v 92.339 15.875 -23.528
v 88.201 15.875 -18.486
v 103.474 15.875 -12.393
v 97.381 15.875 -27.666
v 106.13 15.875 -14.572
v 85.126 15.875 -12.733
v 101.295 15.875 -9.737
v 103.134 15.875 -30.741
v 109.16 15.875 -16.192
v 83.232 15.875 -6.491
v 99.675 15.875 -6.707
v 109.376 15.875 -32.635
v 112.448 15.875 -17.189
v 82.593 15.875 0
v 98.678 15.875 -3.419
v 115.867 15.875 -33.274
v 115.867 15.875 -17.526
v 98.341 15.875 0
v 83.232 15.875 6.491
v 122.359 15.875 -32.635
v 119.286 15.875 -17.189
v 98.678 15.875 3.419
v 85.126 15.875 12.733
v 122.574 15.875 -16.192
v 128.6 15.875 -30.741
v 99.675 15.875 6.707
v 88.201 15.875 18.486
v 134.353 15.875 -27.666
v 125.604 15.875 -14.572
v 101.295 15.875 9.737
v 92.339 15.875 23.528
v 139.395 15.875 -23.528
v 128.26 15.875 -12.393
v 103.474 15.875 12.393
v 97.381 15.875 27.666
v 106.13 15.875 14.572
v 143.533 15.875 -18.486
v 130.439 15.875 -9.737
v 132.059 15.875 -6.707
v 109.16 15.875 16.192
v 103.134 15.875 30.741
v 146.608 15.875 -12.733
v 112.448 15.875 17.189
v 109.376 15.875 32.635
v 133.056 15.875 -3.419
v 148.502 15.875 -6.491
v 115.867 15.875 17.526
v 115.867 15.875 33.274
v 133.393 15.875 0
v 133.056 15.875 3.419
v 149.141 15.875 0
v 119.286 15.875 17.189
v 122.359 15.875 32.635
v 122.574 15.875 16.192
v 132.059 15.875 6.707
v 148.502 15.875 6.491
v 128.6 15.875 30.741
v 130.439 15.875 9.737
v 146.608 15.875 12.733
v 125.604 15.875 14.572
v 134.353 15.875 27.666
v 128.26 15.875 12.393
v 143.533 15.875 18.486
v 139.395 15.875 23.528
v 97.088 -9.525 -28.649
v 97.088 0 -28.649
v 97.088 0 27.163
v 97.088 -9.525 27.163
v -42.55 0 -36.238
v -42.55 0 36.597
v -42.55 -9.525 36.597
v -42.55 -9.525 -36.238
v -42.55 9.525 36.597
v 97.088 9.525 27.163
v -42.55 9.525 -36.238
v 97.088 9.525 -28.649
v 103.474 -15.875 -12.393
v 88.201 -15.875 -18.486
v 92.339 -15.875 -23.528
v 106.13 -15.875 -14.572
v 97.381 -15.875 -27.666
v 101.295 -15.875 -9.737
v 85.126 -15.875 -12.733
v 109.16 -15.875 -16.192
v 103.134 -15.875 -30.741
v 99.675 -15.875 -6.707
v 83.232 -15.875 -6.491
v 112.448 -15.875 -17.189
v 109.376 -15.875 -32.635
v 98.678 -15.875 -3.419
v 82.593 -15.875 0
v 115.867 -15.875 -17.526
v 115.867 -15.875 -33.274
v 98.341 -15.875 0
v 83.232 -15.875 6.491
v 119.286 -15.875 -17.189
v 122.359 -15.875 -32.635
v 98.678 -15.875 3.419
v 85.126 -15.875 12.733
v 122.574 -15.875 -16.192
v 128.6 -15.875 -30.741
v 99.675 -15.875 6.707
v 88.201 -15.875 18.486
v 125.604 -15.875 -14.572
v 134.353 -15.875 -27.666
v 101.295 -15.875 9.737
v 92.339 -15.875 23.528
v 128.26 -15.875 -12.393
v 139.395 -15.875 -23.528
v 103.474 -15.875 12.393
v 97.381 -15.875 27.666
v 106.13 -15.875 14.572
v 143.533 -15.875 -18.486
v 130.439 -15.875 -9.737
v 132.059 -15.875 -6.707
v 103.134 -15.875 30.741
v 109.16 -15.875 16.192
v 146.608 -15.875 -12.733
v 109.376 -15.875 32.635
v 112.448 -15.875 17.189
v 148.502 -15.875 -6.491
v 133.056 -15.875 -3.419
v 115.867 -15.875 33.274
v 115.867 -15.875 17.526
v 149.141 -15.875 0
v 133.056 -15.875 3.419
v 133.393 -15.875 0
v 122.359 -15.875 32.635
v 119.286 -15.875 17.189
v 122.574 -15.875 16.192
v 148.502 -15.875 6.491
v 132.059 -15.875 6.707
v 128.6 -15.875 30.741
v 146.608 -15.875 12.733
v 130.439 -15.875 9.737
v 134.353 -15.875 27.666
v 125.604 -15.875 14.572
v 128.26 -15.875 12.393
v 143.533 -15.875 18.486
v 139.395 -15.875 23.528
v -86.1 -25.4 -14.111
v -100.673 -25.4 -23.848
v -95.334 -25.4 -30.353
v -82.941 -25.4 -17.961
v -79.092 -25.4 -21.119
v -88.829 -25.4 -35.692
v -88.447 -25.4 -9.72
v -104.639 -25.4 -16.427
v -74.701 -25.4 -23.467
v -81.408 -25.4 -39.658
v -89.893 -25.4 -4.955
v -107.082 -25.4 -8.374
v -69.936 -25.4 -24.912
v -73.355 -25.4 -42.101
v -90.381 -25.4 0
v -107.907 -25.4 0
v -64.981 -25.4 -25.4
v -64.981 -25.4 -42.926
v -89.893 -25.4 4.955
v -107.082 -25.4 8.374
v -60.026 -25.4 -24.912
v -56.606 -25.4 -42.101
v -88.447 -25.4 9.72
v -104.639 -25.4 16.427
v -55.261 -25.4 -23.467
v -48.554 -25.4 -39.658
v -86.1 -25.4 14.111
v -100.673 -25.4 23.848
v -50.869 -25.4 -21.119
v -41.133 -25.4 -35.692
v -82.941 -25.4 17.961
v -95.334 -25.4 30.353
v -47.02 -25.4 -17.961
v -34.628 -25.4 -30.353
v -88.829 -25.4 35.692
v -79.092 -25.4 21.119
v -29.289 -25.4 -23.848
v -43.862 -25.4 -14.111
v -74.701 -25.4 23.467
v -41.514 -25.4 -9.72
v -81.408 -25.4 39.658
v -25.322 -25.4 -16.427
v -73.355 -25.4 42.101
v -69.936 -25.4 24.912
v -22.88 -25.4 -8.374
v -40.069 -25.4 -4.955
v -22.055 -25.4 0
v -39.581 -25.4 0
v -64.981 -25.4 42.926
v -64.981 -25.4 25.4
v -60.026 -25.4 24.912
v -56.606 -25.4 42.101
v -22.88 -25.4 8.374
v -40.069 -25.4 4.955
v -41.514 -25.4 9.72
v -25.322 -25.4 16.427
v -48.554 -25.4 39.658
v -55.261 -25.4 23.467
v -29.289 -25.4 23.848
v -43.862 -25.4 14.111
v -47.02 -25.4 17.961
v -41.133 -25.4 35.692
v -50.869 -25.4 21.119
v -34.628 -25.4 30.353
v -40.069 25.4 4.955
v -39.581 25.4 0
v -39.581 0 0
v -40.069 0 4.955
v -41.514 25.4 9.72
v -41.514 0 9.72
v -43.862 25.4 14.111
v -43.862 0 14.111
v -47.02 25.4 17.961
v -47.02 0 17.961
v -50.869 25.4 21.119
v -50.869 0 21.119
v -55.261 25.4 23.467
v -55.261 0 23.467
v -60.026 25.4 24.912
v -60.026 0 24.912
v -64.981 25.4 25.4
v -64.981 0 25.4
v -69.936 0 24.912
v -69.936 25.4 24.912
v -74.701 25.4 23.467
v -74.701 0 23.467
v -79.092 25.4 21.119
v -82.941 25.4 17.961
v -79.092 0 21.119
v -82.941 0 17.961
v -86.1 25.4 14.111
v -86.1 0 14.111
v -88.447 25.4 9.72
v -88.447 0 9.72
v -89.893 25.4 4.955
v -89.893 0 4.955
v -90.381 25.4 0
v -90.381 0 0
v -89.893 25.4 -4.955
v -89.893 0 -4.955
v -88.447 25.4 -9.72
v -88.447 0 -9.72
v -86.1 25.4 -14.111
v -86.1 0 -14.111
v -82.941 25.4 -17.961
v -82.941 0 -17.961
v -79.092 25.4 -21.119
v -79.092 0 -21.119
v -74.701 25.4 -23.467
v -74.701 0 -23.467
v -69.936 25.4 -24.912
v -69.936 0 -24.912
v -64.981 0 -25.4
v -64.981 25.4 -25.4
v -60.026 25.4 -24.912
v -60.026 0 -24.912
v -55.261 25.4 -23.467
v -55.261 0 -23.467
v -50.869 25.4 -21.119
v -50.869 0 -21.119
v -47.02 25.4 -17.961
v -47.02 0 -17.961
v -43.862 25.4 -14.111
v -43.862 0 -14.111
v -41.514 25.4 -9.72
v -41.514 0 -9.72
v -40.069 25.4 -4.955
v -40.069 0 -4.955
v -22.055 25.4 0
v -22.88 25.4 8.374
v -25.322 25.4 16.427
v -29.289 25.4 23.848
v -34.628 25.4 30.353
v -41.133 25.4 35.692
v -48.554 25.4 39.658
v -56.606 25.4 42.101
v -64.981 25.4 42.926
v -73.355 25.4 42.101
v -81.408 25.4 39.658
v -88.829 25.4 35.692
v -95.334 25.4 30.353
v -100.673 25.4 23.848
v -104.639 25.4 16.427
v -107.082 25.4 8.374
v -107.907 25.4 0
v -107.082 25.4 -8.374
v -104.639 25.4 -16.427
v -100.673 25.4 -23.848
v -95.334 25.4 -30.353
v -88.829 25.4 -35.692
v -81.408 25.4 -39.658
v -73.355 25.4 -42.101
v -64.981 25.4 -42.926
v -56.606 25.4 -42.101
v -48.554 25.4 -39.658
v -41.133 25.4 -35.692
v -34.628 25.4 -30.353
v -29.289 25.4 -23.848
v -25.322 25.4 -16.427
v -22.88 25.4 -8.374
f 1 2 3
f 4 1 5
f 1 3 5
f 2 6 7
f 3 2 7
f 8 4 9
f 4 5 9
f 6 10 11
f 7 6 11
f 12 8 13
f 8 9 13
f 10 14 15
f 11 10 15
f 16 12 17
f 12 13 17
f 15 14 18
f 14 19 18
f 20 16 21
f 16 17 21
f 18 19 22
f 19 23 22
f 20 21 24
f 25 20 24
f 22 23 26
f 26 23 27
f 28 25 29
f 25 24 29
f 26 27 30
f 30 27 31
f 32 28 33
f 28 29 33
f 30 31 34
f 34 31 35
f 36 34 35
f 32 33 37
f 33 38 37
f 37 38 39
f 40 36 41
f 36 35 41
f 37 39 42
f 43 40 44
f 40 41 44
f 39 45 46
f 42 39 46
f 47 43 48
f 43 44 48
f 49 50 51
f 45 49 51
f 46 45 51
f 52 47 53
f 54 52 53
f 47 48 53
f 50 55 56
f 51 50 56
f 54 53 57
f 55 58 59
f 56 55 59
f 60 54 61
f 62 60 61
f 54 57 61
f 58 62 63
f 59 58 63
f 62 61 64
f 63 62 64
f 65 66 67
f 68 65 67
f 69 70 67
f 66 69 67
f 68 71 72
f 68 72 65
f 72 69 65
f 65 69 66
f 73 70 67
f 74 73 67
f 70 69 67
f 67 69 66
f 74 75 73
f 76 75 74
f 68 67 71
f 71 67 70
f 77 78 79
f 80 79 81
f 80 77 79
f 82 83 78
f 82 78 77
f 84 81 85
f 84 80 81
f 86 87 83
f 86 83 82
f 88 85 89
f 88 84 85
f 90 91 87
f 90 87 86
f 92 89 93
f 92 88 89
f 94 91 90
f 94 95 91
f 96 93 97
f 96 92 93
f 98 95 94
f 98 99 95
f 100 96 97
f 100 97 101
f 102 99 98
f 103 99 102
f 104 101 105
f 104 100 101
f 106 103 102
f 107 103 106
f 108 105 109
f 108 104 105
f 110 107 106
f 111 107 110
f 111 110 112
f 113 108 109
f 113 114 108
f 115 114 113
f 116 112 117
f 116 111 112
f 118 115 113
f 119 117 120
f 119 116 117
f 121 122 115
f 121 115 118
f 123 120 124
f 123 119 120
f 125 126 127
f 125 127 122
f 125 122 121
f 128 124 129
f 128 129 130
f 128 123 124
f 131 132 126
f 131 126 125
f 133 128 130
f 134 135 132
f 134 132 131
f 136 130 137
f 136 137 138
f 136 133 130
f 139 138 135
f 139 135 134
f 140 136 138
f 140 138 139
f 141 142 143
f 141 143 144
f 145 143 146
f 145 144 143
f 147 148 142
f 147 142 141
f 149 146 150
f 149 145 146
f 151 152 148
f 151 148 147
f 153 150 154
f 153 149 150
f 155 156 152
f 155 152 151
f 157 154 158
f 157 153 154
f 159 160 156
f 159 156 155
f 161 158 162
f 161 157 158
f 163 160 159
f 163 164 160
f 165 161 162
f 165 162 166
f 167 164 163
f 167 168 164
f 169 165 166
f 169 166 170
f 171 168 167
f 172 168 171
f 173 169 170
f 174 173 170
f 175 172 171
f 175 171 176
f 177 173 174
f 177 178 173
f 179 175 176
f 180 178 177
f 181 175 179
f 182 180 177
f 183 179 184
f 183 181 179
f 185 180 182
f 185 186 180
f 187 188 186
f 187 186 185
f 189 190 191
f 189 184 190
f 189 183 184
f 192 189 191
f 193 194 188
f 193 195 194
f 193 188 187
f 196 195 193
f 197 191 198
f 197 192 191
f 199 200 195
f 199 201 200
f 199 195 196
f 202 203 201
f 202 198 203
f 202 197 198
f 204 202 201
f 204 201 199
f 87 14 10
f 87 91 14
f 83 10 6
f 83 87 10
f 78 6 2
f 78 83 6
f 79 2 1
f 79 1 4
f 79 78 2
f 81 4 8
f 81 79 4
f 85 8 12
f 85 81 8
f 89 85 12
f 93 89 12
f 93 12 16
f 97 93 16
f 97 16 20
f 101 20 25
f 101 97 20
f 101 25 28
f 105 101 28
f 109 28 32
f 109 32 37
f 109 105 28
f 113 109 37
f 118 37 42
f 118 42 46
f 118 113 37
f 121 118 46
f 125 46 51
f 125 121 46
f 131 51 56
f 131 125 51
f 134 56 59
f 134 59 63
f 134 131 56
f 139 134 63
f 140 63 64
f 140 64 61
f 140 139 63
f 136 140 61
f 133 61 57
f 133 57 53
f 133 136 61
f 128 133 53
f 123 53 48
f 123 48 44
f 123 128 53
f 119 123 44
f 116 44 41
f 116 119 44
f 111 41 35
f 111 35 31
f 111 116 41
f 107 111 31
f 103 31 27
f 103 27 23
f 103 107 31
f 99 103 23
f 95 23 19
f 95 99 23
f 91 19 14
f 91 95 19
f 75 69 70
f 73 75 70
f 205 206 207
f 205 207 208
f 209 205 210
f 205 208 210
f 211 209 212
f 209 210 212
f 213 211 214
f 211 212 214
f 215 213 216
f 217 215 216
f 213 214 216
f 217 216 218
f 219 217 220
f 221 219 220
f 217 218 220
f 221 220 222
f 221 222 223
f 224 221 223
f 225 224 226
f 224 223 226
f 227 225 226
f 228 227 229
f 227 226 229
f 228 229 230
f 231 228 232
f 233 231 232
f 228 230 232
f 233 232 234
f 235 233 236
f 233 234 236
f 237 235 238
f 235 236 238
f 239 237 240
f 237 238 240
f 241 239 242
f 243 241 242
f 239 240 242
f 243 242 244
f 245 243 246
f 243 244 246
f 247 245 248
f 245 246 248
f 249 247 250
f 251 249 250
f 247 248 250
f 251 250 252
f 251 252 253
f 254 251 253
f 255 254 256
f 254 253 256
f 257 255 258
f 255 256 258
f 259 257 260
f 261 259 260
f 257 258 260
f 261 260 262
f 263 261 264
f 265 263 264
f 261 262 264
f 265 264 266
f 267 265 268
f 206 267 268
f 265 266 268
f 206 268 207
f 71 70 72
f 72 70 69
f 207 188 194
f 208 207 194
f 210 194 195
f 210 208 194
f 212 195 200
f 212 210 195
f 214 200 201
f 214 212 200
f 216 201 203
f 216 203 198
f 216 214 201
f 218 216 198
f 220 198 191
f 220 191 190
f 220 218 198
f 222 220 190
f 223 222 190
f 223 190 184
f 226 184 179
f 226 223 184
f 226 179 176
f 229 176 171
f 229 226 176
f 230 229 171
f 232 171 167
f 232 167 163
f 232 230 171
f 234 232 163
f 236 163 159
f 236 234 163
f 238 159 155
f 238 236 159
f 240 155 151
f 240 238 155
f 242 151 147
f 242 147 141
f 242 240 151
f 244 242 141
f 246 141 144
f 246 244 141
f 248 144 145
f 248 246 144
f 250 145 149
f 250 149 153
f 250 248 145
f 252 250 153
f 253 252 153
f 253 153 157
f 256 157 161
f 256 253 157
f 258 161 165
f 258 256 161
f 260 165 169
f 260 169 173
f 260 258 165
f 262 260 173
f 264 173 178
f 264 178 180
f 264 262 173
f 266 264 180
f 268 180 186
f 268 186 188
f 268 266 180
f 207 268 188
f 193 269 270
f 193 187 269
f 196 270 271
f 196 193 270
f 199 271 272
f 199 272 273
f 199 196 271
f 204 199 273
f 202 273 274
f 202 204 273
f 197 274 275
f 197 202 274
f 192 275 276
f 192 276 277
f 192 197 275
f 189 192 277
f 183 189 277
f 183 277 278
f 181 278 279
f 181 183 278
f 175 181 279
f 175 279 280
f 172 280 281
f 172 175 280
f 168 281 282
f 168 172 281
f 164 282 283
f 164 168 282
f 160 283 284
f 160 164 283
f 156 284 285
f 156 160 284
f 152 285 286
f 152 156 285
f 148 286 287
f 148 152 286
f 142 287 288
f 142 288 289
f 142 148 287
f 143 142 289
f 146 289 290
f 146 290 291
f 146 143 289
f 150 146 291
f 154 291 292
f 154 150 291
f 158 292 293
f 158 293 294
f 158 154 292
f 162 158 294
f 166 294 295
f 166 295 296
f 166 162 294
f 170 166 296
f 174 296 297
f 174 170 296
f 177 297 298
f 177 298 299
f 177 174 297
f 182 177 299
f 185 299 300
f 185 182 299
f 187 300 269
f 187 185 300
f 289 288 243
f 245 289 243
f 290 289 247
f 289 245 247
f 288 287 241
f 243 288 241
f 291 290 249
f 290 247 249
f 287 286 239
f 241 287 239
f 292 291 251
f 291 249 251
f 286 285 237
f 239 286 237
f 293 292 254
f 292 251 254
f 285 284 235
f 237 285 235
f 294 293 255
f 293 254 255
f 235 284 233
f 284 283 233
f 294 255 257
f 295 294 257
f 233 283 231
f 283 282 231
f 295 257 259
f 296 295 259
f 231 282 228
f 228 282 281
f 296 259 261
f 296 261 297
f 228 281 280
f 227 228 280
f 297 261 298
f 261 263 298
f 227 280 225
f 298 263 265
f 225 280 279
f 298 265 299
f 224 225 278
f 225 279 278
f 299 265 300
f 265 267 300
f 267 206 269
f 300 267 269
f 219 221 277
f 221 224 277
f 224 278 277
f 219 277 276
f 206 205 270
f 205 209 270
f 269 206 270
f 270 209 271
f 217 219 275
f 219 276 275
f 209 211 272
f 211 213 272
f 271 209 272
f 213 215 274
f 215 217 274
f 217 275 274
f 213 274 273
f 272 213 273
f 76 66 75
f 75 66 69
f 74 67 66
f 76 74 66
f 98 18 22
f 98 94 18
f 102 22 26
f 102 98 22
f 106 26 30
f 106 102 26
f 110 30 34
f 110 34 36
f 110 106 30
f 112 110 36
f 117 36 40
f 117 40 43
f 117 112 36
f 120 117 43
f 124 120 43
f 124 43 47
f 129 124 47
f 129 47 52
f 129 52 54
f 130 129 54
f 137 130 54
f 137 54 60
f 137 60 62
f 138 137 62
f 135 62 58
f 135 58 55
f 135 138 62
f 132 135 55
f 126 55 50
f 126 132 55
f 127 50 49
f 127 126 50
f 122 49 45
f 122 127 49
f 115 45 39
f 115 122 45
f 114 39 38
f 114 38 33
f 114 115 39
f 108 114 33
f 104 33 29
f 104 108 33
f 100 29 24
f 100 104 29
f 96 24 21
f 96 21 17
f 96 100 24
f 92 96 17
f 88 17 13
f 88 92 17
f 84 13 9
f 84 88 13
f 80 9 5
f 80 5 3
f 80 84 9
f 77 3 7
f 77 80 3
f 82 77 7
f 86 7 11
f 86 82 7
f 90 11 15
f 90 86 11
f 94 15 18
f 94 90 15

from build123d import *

# Parameters (mm, degrees)
F1_DEPTH = 15.875
F0_R     = 42.926
F0_R_2   = 25.4
F2_DEPTH = 25.4
F3_DEPTH = 25.4
F4_DEPTH = 15.875
F6_DEPTH = 9.525
F7_DEPTH = 9.525


with BuildPart() as f1:
    # F0 (on Front) → F1 (new body)
    with BuildSketch(Plane.XZ):
        with BuildLine():
            ThreePointArc((149.141068, 0), (115.867068, 33.274), (82.593068, 0))
            ThreePointArc((82.593068, 0), (115.867068, -33.274), (149.141068, 0))
        make_face()
        with BuildLine():
            ThreePointArc((133.393068, 0), (115.867068, -17.526), (98.341068, 0))
            ThreePointArc((98.341068, 0), (115.867068, 17.526), (133.393068, 0))
        make_face(mode=Mode.SUBTRACT)
    extrude(amount=F1_DEPTH)

    # F0 (on Front) → F4 (join)
    with BuildSketch(Plane.XZ):
        with BuildLine():
            ThreePointArc((149.141068, 0), (115.867068, 33.274), (82.593068, 0))
            ThreePointArc((82.593068, 0), (115.867068, -33.274), (149.141068, 0))
        make_face()
        with BuildLine():
            ThreePointArc((133.393068, 0), (115.867068, -17.526), (98.341068, 0))
            ThreePointArc((98.341068, 0), (115.867068, 17.526), (133.393068, 0))
        make_face(mode=Mode.SUBTRACT)
    extrude(amount=-F4_DEPTH)


with BuildPart() as f2:
    # F0 (on Front) → F2 (new body)
    with BuildSketch(Plane.XZ):
        with Locations((-64.980932, 0)):
            Circle(F0_R)
        with Locations((-64.980932, 0)):
            Circle(F0_R_2, mode=Mode.SUBTRACT)
    extrude(amount=F2_DEPTH)

    # F0 (on Front) → F3 (join)
    with BuildSketch(Plane.XZ):
        with Locations((-64.980932, 0)):
            Circle(F0_R)
        with Locations((-64.980932, 0)):
            Circle(F0_R_2, mode=Mode.SUBTRACT)
    extrude(amount=-F3_DEPTH)


with BuildPart() as f6:
    # F5 (on Front) → F6 (new body)
    with BuildSketch(Plane.XZ):
        Polygon((97.087689, 27.163437), (-42.550076, 36.59654), (-42.550076, -36.237787), (97.087689, -28.649395), align=None)
    extrude(amount=F6_DEPTH)


with BuildPart() as f7:
    # F6_face (on face) → F7 (new body)
    with BuildSketch(Plane(origin=(24.189527, 0, -0.261462), x_dir=(1, 0, 0), z_dir=(0, 1, 0))):
        Polygon((-66.739602, 35.976326), (-66.739602, -36.858002), (72.898162, -27.424898), (72.898162, 28.387934), align=None)
    extrude(amount=F7_DEPTH)


solid = Compound([f1.part, f2.part, f6.part, f7.part])
